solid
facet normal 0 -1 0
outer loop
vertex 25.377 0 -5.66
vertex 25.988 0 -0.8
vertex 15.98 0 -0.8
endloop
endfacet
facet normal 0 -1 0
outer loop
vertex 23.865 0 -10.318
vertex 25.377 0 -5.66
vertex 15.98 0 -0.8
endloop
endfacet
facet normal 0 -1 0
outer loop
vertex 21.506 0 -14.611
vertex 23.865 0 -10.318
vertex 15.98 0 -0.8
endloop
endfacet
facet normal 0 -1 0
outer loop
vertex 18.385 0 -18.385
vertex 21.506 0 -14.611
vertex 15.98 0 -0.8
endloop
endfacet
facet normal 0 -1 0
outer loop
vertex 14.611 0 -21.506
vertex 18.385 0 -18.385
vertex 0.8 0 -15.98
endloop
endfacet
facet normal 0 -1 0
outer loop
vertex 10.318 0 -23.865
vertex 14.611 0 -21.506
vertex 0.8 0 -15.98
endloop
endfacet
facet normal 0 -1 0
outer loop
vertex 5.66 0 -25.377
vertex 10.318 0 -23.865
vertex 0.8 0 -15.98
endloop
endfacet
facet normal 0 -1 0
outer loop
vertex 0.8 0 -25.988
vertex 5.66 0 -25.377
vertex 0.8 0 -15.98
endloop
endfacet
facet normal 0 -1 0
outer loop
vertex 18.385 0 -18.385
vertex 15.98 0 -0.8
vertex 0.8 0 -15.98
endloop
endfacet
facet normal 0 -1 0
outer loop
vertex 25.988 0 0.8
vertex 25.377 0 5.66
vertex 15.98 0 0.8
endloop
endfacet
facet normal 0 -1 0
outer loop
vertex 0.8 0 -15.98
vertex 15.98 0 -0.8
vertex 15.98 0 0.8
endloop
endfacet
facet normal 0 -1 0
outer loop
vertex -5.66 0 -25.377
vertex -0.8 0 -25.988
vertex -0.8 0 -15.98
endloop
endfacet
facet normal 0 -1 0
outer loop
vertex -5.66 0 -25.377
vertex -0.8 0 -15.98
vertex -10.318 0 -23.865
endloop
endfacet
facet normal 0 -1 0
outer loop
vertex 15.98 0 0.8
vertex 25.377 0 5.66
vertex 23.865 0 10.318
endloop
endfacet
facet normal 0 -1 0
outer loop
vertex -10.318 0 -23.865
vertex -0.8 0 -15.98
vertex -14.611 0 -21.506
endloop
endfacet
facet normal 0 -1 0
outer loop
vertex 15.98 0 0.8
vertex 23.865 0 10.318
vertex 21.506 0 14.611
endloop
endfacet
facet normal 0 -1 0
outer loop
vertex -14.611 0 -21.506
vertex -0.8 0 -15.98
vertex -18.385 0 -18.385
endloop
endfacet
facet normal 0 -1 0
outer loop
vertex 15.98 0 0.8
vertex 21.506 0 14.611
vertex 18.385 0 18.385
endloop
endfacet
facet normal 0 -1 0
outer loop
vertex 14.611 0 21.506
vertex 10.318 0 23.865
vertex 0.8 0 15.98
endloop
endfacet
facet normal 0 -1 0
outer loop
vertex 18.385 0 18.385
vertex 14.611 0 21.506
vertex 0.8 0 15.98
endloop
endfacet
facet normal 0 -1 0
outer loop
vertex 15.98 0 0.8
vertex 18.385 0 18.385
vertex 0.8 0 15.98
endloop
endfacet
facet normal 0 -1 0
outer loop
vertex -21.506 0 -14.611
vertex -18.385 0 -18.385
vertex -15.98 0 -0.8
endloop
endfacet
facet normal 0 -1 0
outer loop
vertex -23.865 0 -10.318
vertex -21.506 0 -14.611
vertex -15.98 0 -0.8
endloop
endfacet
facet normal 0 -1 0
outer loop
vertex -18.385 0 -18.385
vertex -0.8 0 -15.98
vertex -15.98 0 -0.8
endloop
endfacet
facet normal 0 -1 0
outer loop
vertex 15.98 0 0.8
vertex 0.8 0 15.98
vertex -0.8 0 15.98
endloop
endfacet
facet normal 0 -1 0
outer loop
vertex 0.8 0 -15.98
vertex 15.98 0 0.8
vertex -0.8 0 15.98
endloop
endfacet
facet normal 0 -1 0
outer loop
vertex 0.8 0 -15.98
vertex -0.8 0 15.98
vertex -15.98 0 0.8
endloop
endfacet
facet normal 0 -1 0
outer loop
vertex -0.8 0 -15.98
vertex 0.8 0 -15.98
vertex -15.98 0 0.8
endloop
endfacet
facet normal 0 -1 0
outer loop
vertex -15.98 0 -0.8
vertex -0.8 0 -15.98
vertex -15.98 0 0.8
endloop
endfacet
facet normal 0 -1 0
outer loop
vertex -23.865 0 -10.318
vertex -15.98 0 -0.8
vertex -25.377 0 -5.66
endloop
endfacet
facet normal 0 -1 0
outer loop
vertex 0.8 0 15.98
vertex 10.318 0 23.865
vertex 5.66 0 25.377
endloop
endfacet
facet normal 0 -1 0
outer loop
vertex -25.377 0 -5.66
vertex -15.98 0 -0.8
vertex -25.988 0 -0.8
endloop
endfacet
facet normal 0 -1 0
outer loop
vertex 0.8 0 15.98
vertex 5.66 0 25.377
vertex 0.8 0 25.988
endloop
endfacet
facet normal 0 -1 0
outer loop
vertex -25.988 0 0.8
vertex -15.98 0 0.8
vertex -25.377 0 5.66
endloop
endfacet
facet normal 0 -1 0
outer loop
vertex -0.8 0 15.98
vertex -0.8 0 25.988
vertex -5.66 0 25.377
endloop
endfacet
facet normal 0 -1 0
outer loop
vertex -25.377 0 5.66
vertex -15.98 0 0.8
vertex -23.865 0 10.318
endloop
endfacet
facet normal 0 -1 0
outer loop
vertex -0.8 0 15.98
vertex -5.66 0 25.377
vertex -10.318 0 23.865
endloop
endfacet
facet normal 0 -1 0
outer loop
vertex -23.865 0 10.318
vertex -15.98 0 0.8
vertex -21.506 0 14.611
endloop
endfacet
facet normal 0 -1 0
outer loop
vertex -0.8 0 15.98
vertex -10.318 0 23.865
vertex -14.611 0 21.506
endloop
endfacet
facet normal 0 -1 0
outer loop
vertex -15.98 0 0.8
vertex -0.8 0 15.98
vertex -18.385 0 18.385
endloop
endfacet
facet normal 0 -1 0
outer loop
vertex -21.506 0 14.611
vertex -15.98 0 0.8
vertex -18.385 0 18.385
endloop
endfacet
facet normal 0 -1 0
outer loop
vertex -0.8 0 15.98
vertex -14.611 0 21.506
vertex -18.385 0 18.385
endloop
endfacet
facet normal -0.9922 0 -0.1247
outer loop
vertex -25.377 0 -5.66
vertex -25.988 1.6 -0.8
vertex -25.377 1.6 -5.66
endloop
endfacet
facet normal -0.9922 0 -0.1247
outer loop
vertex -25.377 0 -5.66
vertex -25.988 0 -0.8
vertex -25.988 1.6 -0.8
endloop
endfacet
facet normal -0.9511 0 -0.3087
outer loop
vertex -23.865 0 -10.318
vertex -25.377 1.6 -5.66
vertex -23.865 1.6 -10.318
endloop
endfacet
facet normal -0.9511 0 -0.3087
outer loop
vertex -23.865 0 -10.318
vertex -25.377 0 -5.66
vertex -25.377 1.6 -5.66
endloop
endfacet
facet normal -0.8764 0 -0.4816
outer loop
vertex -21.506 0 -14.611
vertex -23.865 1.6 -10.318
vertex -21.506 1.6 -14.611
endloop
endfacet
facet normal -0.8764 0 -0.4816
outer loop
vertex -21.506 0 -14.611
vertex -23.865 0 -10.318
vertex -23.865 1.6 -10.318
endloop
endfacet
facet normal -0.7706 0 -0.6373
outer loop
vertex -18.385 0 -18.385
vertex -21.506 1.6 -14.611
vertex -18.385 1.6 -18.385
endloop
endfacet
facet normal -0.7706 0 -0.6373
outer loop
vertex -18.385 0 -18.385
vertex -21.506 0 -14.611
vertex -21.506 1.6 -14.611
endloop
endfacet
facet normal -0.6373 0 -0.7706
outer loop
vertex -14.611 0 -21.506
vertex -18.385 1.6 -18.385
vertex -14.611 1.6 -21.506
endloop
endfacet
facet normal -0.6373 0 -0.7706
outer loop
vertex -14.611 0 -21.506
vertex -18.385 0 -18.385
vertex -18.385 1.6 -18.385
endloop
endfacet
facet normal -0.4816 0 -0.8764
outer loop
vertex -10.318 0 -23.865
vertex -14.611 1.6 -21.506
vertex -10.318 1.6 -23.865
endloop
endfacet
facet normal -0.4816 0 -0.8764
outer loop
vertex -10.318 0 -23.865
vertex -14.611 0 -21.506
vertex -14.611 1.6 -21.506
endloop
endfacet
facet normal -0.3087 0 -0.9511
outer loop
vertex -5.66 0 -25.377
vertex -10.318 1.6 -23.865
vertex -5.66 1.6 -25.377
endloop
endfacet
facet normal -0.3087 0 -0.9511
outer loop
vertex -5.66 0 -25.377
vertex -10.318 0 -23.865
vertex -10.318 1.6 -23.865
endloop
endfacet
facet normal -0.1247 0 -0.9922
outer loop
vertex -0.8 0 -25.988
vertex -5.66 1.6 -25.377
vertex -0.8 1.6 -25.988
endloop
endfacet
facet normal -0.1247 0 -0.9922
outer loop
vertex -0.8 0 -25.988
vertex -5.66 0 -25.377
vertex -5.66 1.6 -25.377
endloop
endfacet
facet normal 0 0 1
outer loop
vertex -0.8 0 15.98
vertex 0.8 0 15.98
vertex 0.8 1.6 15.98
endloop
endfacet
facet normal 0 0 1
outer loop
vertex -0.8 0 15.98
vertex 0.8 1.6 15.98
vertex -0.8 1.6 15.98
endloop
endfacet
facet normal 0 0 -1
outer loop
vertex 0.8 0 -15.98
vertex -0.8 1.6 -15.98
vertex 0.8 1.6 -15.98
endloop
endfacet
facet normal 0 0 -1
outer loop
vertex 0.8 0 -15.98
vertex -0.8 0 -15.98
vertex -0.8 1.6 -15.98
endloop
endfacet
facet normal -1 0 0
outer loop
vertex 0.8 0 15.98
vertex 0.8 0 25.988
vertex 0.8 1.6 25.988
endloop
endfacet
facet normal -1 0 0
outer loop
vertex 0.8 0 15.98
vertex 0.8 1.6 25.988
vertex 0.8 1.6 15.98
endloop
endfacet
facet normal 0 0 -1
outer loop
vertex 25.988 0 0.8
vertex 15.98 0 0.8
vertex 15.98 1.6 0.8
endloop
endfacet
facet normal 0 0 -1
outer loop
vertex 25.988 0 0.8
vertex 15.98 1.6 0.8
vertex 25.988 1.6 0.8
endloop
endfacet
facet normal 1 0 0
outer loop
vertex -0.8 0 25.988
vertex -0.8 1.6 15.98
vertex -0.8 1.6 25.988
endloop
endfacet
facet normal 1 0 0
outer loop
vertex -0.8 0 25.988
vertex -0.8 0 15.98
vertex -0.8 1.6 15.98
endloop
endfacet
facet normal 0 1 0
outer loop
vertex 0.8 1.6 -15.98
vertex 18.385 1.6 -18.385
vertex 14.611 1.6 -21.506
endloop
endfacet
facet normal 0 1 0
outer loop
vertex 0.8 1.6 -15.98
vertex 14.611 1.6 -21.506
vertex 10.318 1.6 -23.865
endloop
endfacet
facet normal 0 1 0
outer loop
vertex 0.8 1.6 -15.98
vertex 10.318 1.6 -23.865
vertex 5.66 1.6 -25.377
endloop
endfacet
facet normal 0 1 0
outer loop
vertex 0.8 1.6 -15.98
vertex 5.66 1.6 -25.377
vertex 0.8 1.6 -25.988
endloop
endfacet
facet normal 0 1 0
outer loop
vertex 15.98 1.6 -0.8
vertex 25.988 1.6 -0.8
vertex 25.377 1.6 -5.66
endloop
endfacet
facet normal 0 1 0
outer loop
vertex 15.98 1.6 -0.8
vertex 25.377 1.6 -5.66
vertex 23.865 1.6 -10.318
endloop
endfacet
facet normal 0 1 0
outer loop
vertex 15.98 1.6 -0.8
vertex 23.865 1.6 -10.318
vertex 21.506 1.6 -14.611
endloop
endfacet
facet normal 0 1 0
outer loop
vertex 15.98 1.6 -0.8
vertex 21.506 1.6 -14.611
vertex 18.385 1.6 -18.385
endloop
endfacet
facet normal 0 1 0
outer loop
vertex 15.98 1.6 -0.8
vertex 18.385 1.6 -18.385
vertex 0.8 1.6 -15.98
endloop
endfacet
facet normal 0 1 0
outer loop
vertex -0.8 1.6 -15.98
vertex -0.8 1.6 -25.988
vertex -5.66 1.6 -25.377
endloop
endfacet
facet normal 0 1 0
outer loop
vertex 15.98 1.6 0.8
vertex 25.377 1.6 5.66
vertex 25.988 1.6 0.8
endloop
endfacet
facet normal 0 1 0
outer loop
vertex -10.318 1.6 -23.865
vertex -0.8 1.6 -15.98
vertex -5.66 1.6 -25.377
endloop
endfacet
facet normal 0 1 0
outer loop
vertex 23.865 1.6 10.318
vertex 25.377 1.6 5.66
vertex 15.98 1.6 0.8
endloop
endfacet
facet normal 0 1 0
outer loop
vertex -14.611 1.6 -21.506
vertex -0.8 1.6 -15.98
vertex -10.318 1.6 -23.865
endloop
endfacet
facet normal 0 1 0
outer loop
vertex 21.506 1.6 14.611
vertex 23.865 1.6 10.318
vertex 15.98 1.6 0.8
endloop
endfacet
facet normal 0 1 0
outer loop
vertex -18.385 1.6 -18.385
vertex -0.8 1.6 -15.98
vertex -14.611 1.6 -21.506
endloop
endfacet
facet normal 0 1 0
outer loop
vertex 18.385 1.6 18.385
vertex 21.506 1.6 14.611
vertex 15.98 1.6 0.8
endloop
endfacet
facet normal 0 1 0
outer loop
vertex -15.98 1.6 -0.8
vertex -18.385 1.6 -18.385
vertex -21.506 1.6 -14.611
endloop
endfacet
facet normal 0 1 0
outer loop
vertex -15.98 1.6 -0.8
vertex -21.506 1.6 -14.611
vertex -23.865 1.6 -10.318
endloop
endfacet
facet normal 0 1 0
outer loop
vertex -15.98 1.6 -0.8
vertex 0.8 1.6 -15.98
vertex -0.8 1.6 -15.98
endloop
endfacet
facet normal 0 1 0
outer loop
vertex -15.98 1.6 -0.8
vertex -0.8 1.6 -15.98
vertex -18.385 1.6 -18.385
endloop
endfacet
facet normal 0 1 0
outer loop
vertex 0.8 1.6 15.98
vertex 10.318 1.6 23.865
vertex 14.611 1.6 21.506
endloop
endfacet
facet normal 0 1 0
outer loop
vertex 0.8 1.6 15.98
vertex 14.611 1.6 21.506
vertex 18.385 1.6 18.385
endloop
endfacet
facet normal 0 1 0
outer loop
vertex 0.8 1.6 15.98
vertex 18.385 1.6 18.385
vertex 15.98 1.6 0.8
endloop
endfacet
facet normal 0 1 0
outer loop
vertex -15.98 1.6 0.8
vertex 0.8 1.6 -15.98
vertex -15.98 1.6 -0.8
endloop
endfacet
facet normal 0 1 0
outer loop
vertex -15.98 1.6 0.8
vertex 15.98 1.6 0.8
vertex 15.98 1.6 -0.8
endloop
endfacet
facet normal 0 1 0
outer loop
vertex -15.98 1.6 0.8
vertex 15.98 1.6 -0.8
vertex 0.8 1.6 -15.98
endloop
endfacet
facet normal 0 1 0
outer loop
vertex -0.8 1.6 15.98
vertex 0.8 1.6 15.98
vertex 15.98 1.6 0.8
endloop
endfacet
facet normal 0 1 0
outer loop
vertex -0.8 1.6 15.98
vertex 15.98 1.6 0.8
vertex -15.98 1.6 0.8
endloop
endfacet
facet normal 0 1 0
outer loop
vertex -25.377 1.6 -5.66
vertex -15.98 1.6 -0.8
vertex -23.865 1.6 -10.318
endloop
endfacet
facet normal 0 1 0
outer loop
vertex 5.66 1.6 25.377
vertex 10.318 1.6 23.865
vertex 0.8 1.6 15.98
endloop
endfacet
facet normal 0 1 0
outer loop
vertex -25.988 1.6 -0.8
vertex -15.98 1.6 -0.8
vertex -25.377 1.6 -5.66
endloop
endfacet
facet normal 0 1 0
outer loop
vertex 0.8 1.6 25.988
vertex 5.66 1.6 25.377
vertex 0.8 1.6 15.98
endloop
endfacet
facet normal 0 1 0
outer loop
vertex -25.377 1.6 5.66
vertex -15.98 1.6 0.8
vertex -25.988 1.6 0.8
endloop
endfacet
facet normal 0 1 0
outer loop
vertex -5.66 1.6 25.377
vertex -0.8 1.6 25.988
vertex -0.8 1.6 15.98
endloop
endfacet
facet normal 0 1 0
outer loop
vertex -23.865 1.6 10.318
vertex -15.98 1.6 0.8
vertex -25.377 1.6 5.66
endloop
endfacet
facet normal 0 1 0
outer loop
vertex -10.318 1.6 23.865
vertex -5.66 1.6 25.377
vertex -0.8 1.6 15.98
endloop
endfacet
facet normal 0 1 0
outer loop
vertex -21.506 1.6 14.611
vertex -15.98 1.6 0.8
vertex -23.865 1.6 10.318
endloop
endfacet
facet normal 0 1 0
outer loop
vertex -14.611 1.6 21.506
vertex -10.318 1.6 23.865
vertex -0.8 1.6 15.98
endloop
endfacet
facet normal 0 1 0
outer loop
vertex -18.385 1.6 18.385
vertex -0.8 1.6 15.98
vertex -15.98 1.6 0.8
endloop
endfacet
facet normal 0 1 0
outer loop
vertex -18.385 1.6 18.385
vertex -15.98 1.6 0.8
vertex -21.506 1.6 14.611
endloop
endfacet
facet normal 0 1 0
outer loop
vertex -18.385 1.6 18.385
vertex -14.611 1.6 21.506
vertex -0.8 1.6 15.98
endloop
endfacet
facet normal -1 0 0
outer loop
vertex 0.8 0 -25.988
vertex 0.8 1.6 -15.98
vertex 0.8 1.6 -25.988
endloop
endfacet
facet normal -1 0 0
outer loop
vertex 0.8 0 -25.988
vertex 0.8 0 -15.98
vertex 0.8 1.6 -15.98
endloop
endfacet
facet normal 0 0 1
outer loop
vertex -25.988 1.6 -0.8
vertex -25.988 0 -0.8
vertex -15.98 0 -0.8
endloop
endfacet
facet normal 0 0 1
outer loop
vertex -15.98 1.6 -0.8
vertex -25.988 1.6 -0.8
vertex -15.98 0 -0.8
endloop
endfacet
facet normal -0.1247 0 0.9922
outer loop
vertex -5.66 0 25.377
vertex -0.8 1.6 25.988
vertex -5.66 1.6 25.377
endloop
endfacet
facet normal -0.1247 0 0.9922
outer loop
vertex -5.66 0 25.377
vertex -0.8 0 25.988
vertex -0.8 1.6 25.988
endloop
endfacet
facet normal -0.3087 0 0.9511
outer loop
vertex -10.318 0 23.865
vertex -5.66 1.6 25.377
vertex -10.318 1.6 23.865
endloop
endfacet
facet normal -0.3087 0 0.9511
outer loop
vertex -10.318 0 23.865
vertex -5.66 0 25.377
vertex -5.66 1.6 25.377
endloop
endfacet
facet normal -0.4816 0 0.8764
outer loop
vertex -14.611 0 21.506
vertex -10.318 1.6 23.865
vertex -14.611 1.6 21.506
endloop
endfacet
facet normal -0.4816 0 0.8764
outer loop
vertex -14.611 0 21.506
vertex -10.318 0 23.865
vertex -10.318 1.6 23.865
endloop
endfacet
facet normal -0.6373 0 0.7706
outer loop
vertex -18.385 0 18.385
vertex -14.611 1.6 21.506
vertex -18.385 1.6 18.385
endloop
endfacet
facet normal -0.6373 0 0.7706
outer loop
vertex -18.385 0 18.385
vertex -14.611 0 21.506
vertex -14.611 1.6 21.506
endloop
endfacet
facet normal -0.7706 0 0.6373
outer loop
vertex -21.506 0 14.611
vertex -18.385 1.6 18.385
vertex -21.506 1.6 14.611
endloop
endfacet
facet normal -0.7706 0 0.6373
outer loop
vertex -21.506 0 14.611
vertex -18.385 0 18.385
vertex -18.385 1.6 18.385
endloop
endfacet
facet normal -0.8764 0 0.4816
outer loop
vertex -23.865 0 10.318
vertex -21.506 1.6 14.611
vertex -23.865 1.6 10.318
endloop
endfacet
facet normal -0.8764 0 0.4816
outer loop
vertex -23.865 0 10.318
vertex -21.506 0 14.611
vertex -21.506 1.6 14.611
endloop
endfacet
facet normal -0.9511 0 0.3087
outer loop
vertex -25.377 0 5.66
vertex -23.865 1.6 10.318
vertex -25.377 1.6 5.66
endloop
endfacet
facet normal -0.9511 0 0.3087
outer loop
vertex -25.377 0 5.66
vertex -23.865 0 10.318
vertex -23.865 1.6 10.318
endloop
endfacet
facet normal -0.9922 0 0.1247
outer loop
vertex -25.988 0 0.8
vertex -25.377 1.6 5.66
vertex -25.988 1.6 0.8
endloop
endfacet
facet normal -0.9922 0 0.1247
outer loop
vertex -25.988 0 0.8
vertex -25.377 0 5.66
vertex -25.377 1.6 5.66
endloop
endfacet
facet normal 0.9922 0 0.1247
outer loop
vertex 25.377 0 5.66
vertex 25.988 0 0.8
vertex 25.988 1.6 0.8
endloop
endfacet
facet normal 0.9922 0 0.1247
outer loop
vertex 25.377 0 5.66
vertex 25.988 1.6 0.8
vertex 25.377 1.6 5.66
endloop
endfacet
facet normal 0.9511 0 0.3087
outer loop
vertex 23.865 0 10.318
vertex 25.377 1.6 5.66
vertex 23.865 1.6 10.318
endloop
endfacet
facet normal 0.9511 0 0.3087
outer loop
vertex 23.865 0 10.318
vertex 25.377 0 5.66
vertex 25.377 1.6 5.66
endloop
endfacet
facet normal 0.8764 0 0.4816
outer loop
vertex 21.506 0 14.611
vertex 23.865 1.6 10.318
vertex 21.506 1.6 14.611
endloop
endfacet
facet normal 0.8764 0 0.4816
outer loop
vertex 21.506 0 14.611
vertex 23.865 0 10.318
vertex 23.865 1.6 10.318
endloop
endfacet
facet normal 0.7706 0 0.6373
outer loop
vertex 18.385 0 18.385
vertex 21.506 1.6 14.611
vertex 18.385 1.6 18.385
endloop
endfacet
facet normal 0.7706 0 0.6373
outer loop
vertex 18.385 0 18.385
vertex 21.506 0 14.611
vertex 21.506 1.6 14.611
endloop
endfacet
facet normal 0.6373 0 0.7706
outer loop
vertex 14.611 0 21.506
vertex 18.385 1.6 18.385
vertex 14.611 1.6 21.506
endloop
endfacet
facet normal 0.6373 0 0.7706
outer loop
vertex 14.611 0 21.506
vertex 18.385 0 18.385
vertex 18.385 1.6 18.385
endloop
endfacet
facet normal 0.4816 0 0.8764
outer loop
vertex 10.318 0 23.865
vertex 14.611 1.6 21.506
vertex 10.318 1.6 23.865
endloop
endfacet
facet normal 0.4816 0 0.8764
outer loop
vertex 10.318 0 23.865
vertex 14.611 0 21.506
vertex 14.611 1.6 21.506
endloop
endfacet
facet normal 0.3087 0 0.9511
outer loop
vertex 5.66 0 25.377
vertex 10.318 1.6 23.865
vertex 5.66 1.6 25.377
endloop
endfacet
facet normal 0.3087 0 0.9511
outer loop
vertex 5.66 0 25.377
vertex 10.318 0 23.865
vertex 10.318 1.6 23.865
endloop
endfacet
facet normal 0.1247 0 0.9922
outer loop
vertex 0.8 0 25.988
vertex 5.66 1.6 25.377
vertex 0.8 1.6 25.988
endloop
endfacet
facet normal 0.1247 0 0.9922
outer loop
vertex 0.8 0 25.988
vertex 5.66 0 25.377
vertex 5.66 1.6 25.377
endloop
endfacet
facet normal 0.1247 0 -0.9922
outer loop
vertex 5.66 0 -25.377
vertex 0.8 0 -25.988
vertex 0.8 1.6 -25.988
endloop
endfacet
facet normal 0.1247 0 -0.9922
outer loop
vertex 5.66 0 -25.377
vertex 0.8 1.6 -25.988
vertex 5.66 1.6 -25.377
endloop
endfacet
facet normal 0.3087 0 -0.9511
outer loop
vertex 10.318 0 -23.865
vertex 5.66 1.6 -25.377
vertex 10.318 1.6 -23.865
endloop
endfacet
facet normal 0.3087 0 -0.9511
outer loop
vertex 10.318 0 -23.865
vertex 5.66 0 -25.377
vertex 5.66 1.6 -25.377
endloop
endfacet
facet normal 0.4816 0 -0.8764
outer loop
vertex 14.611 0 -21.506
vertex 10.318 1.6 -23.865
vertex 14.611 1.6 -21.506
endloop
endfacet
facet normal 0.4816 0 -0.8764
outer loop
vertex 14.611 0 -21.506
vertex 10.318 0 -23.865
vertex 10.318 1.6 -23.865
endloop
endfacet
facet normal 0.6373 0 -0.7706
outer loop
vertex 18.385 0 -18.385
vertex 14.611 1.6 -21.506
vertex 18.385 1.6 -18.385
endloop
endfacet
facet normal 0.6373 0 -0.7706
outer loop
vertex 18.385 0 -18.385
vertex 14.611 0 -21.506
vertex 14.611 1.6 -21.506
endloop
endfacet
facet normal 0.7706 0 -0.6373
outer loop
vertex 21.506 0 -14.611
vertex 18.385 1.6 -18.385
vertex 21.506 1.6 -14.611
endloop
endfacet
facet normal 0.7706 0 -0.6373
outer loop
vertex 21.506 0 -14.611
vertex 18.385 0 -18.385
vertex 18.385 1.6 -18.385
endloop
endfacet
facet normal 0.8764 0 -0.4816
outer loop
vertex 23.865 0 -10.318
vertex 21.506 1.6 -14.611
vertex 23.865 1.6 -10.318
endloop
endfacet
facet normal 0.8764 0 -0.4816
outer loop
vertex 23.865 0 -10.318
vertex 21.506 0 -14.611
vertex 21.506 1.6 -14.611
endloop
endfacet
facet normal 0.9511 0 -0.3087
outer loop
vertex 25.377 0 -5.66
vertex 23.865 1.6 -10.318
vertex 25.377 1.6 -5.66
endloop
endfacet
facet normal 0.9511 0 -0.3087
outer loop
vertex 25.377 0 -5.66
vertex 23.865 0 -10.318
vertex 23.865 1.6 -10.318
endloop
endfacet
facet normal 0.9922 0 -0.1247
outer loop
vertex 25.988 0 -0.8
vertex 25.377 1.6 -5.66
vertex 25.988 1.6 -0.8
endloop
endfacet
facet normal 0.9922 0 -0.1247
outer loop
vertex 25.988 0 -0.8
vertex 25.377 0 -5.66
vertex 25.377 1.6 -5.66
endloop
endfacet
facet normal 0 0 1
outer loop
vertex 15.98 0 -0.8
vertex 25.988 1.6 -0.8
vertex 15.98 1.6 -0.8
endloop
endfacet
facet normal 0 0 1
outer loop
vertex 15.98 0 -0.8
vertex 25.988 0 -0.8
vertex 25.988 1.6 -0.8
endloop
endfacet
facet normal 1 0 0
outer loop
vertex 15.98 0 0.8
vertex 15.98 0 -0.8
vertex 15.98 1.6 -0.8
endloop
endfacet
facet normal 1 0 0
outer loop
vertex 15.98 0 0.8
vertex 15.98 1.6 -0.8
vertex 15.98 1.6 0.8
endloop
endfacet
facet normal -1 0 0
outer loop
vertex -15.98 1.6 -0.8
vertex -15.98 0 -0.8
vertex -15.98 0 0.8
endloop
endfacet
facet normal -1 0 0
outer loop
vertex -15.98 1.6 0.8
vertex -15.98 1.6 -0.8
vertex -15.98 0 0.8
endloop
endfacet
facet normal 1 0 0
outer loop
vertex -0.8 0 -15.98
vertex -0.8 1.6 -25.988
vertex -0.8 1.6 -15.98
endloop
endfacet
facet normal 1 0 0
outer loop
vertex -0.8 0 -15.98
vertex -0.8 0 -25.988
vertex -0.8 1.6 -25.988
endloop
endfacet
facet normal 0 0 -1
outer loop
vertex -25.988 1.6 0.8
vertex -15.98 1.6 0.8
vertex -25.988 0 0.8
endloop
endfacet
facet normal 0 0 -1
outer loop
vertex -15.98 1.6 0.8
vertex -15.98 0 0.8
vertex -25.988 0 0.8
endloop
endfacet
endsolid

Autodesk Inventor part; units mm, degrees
ref_plane "YZ Plane" through (0, 0, 0) normal (1, 0, 0) x (0, 1, 0)
ref_plane "XZ Plane" through (0, 0, 0) normal (0, 1, 0) x (-1, 0, 0)
ref_plane "XY Plane" through (0, 0, 0) normal (0, 0, 1) x (1, 0, 0)
sketch "Sketch1" plane through (0, 0, 0) normal (0, 1, 0) x (-1, 0, 0)
  point P0 (0, 0)
sketch "Sketch2" plane through (0, 0, 0) normal (0, 1, 0) x (-1, 0, 0)
  line L0 (46.5779, 0.8) -> (15.98, 0.8) construction
  line L1 (47.5028, -0.8) -> (-15.98, -0.8) construction
  line L2 (0.8, 38.8593) -> (0.8, 25.9877) construction
  line L3 (-0.8, 36.7319) -> (-0.8, -46.7895) construction
  arc A0 (15.98, 0.8) -> (0.8, 15.98) centre (0, 0) ccw construction
  arc A1 (-0.8, 15.98) -> (-15.98, 0.8) centre (0, 0) ccw construction
  line L4 (0.8, 25.9877) -> (0.8, -15.98) construction
  arc A2 (-0.8, 25.9877) -> (-25.9877, 0.8) centre (0, 0) ccw
  line L5 (0.8, -15.98) -> (0.8, -47.3445) construction
  arc A3 (0.8, -25.9877) -> (25.9877, -0.8) centre (0, 0) ccw
  arc A4 (25.9877, 0.8) -> (0.8, 25.9877) centre (0, 0) ccw
  line L6 (15.98, 0.8) -> (-25.9877, 0.8) construction
  line L7 (-15.98, -0.8) -> (-25.9877, -0.8) construction
  line L8 (-25.9877, 0.8) -> (-44.4844, 0.8) construction
  line L9 (-25.9877, -0.8) -> (-44.0655, -0.8) construction
  arc A5 (-25.9877, -0.8) -> (-0.8, -25.9877) centre (0, 0) ccw
  arc A6 (-15.98, -0.8) -> (-0.8, -15.98) centre (0, 0) ccw construction
  arc A7 (0.8, -15.98) -> (15.98, -0.8) centre (0, 0) ccw construction
  circle A8 centre (0, 0) radius 16 construction
  circle A9 centre (0, 0) radius 26 construction
  line L10 (25.9877, -0.8) -> (15.98, -0.8)
  line L11 (15.98, -0.8) -> (15.98, 0.8)
  line L12 (15.98, 0.8) -> (25.9877, 0.8)
  line L13 (0.8, -25.9877) -> (0.8, -15.98)
  line L14 (0.8, -15.98) -> (-0.8, -15.98)
  line L15 (-0.8, -15.98) -> (-0.8, -25.9877)
  line L16 (-25.9877, -0.8) -> (-15.98, -0.8)
  line L17 (-15.98, -0.8) -> (-15.98, 0.8)
  line L18 (-15.98, 0.8) -> (-25.9877, 0.8)
  line L19 (-0.8, 25.9877) -> (-0.8, 15.98)
  line L20 (-0.8, 15.98) -> (0.8, 15.98)
  line L21 (0.8, 15.98) -> (0.8, 25.9877)
  line L22 (0, 0) -> (-0.8, -25.9877) construction
  line L23 (0, 0) -> (-25.9877, -0.8) construction
  dimension "d2" = 0.8
  dimension "d3" = 0.8
  dimension "d4" = 0.8
  dimension "d5" = 0.8
  dimension "d6" = 32
  dimension "d7" = 0
  dimension "d8" = 0
  dimension "d9" = 52
  dimension "d10" = 0
  dimension "d11" = 0
  dimension "d12" = 0
  dimension "d15" = 86.474
extrude "Extrusion1" add sketch "Sketch2" along normal blind 1.6
equation "\"d3\" = d2"
equation "\"d4\" = d2"
equation "\"d5\" = d2"
properties part number "standin_quad_hub"
